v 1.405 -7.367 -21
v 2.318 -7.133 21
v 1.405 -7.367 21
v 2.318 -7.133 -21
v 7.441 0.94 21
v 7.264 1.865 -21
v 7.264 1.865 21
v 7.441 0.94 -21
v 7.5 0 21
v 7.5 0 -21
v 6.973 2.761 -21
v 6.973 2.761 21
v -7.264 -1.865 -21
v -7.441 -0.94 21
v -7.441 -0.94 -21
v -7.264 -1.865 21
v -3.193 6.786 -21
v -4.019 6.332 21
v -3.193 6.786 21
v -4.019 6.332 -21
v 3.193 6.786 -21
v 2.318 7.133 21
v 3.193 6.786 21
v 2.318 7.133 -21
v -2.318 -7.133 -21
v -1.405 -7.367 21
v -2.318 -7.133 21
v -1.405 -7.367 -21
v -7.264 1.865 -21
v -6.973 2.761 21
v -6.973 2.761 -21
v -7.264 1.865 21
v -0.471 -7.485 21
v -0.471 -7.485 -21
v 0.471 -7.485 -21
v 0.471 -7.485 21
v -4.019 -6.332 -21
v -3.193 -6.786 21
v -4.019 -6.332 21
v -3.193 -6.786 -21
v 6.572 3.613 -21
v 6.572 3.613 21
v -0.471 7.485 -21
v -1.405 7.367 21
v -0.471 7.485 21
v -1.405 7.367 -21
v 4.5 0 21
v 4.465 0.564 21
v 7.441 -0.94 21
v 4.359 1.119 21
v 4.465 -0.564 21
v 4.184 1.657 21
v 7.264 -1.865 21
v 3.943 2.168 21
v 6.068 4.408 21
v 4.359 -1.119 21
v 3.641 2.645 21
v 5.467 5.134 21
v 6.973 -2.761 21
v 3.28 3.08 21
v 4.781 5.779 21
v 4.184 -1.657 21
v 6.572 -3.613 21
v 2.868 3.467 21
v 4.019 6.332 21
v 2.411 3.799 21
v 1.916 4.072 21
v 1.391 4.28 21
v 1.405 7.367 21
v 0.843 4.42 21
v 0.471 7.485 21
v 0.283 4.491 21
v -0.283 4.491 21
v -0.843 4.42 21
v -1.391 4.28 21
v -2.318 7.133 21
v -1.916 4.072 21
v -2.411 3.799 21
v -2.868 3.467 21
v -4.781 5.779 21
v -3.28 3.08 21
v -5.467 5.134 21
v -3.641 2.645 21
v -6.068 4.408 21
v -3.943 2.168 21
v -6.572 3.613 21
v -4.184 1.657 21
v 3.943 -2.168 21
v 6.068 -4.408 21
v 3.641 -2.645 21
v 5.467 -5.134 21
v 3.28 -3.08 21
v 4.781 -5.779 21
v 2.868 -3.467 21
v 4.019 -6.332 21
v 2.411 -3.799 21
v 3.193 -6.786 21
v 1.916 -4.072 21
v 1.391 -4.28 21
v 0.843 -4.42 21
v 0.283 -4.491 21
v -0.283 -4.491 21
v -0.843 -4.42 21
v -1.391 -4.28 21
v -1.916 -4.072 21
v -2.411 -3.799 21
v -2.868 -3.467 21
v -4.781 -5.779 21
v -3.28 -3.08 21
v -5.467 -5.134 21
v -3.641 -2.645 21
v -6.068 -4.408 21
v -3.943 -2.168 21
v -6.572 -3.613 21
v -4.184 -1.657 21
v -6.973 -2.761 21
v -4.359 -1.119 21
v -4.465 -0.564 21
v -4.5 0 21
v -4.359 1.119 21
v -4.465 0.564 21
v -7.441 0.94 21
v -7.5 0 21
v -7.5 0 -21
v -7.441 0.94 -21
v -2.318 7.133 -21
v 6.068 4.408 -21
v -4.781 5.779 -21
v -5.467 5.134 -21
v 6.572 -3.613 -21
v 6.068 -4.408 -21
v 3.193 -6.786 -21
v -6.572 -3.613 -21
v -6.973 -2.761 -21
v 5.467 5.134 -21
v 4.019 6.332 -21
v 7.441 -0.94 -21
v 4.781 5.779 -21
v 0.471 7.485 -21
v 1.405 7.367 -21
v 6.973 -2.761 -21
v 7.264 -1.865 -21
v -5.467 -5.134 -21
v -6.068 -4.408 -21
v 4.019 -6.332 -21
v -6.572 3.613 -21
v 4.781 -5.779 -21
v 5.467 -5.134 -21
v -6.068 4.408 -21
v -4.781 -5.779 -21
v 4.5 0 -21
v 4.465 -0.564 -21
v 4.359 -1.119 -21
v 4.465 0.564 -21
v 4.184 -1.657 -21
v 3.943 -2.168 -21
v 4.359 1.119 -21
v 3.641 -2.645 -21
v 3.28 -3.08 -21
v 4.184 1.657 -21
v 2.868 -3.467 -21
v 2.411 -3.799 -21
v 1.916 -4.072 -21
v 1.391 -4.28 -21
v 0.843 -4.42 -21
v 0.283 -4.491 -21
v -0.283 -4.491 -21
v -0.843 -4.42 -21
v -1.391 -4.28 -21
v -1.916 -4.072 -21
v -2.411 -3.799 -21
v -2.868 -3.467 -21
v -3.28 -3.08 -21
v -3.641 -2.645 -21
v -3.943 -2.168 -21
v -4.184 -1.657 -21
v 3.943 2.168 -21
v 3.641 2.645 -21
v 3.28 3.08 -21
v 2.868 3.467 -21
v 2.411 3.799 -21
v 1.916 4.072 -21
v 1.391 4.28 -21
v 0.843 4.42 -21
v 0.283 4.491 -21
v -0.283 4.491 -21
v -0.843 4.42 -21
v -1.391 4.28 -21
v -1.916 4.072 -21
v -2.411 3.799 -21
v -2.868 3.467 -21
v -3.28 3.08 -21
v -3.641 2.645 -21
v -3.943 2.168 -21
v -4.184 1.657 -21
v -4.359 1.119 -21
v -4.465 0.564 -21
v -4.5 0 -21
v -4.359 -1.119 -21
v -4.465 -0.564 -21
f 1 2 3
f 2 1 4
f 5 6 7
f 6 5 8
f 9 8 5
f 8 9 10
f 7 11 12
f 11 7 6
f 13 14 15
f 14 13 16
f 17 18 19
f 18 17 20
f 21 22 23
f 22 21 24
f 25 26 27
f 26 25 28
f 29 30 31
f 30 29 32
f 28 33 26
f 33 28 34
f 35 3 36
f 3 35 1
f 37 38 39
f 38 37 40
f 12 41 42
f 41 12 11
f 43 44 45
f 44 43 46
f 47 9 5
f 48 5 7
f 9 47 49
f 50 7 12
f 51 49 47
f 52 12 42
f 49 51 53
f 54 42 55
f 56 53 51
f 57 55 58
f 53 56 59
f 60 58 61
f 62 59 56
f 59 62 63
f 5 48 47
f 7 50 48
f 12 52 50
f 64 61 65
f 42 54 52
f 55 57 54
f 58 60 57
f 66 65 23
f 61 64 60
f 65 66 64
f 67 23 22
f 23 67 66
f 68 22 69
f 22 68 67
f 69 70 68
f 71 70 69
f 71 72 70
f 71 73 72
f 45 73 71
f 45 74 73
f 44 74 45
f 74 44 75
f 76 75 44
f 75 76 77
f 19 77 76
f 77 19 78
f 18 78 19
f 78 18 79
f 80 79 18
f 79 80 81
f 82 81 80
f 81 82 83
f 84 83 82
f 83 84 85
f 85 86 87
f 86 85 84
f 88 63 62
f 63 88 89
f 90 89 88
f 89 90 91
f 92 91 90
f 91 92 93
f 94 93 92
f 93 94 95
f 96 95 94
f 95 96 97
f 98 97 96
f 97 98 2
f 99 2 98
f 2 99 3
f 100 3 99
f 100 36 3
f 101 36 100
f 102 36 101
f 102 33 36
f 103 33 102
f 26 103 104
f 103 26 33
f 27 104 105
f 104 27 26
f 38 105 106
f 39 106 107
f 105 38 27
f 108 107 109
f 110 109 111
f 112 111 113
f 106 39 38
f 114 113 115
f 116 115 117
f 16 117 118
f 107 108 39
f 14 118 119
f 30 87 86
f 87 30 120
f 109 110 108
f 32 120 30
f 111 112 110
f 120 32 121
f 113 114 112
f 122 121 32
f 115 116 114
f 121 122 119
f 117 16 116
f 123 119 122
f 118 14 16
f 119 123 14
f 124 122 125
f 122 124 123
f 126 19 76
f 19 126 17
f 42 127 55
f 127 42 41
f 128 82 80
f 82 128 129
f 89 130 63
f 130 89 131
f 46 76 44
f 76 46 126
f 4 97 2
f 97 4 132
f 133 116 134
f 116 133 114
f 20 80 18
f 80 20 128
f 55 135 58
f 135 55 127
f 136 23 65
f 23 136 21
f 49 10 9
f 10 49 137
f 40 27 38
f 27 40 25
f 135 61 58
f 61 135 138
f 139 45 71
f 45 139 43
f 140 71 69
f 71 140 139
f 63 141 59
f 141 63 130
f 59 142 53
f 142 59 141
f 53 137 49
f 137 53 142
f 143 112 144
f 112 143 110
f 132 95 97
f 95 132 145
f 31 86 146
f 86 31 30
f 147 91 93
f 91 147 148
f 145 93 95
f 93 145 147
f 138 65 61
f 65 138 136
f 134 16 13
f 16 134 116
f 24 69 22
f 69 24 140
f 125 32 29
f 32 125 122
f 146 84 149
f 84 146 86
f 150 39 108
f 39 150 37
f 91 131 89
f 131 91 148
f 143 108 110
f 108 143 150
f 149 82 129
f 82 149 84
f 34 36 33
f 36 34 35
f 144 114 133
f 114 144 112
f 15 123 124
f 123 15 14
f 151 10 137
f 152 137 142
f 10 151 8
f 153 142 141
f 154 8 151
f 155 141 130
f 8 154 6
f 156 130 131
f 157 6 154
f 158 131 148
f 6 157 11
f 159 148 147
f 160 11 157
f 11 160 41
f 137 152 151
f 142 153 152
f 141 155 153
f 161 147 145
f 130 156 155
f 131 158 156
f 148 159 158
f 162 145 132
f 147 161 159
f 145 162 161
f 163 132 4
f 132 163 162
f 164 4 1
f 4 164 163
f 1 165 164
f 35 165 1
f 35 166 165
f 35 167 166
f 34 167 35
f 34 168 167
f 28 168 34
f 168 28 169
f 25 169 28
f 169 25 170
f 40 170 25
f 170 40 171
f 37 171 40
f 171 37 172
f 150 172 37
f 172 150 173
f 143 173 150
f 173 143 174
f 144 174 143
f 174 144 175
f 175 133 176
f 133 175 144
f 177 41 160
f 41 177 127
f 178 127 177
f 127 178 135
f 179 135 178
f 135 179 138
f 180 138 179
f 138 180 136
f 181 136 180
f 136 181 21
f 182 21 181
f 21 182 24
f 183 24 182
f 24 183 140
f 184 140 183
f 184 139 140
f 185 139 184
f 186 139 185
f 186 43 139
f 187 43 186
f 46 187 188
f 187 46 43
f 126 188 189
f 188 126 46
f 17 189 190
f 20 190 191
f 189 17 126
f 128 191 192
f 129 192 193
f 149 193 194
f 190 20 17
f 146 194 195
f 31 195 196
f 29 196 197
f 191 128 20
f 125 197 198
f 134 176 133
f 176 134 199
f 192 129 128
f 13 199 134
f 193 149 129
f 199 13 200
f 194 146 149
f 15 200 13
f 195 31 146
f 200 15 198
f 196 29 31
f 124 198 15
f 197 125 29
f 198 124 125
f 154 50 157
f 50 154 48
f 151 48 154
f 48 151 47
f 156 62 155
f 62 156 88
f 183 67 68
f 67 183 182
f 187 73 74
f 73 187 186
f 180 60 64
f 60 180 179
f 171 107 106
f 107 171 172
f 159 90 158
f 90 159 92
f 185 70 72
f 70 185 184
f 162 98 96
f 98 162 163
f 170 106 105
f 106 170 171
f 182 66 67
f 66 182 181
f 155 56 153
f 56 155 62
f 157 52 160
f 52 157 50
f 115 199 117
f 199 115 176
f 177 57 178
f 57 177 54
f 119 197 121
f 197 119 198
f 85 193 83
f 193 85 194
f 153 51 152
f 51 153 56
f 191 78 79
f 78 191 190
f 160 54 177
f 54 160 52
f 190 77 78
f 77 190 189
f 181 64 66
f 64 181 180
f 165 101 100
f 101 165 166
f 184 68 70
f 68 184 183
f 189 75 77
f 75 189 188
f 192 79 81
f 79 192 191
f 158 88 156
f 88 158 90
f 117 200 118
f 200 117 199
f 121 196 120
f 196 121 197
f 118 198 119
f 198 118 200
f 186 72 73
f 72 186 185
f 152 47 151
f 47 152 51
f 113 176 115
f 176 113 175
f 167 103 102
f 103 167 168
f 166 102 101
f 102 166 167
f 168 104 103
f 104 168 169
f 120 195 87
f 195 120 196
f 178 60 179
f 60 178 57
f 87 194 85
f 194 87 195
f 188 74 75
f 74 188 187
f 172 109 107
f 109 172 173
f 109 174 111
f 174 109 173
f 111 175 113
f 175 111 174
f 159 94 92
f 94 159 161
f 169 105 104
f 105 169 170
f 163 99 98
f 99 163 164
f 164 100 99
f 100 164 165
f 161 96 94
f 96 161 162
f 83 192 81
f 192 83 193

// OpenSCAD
$fn = 50;


difference() {
	union() {
		translate(v = [0, 0, -21.0000000000]) {
			cylinder(h = 42, r = 7.5000000000);
		}
	}
	union() {
		translate(v = [0, 0, -100.0000000000]) {
			cylinder(h = 200, r = 4.5000000000);
		}
	}
}
